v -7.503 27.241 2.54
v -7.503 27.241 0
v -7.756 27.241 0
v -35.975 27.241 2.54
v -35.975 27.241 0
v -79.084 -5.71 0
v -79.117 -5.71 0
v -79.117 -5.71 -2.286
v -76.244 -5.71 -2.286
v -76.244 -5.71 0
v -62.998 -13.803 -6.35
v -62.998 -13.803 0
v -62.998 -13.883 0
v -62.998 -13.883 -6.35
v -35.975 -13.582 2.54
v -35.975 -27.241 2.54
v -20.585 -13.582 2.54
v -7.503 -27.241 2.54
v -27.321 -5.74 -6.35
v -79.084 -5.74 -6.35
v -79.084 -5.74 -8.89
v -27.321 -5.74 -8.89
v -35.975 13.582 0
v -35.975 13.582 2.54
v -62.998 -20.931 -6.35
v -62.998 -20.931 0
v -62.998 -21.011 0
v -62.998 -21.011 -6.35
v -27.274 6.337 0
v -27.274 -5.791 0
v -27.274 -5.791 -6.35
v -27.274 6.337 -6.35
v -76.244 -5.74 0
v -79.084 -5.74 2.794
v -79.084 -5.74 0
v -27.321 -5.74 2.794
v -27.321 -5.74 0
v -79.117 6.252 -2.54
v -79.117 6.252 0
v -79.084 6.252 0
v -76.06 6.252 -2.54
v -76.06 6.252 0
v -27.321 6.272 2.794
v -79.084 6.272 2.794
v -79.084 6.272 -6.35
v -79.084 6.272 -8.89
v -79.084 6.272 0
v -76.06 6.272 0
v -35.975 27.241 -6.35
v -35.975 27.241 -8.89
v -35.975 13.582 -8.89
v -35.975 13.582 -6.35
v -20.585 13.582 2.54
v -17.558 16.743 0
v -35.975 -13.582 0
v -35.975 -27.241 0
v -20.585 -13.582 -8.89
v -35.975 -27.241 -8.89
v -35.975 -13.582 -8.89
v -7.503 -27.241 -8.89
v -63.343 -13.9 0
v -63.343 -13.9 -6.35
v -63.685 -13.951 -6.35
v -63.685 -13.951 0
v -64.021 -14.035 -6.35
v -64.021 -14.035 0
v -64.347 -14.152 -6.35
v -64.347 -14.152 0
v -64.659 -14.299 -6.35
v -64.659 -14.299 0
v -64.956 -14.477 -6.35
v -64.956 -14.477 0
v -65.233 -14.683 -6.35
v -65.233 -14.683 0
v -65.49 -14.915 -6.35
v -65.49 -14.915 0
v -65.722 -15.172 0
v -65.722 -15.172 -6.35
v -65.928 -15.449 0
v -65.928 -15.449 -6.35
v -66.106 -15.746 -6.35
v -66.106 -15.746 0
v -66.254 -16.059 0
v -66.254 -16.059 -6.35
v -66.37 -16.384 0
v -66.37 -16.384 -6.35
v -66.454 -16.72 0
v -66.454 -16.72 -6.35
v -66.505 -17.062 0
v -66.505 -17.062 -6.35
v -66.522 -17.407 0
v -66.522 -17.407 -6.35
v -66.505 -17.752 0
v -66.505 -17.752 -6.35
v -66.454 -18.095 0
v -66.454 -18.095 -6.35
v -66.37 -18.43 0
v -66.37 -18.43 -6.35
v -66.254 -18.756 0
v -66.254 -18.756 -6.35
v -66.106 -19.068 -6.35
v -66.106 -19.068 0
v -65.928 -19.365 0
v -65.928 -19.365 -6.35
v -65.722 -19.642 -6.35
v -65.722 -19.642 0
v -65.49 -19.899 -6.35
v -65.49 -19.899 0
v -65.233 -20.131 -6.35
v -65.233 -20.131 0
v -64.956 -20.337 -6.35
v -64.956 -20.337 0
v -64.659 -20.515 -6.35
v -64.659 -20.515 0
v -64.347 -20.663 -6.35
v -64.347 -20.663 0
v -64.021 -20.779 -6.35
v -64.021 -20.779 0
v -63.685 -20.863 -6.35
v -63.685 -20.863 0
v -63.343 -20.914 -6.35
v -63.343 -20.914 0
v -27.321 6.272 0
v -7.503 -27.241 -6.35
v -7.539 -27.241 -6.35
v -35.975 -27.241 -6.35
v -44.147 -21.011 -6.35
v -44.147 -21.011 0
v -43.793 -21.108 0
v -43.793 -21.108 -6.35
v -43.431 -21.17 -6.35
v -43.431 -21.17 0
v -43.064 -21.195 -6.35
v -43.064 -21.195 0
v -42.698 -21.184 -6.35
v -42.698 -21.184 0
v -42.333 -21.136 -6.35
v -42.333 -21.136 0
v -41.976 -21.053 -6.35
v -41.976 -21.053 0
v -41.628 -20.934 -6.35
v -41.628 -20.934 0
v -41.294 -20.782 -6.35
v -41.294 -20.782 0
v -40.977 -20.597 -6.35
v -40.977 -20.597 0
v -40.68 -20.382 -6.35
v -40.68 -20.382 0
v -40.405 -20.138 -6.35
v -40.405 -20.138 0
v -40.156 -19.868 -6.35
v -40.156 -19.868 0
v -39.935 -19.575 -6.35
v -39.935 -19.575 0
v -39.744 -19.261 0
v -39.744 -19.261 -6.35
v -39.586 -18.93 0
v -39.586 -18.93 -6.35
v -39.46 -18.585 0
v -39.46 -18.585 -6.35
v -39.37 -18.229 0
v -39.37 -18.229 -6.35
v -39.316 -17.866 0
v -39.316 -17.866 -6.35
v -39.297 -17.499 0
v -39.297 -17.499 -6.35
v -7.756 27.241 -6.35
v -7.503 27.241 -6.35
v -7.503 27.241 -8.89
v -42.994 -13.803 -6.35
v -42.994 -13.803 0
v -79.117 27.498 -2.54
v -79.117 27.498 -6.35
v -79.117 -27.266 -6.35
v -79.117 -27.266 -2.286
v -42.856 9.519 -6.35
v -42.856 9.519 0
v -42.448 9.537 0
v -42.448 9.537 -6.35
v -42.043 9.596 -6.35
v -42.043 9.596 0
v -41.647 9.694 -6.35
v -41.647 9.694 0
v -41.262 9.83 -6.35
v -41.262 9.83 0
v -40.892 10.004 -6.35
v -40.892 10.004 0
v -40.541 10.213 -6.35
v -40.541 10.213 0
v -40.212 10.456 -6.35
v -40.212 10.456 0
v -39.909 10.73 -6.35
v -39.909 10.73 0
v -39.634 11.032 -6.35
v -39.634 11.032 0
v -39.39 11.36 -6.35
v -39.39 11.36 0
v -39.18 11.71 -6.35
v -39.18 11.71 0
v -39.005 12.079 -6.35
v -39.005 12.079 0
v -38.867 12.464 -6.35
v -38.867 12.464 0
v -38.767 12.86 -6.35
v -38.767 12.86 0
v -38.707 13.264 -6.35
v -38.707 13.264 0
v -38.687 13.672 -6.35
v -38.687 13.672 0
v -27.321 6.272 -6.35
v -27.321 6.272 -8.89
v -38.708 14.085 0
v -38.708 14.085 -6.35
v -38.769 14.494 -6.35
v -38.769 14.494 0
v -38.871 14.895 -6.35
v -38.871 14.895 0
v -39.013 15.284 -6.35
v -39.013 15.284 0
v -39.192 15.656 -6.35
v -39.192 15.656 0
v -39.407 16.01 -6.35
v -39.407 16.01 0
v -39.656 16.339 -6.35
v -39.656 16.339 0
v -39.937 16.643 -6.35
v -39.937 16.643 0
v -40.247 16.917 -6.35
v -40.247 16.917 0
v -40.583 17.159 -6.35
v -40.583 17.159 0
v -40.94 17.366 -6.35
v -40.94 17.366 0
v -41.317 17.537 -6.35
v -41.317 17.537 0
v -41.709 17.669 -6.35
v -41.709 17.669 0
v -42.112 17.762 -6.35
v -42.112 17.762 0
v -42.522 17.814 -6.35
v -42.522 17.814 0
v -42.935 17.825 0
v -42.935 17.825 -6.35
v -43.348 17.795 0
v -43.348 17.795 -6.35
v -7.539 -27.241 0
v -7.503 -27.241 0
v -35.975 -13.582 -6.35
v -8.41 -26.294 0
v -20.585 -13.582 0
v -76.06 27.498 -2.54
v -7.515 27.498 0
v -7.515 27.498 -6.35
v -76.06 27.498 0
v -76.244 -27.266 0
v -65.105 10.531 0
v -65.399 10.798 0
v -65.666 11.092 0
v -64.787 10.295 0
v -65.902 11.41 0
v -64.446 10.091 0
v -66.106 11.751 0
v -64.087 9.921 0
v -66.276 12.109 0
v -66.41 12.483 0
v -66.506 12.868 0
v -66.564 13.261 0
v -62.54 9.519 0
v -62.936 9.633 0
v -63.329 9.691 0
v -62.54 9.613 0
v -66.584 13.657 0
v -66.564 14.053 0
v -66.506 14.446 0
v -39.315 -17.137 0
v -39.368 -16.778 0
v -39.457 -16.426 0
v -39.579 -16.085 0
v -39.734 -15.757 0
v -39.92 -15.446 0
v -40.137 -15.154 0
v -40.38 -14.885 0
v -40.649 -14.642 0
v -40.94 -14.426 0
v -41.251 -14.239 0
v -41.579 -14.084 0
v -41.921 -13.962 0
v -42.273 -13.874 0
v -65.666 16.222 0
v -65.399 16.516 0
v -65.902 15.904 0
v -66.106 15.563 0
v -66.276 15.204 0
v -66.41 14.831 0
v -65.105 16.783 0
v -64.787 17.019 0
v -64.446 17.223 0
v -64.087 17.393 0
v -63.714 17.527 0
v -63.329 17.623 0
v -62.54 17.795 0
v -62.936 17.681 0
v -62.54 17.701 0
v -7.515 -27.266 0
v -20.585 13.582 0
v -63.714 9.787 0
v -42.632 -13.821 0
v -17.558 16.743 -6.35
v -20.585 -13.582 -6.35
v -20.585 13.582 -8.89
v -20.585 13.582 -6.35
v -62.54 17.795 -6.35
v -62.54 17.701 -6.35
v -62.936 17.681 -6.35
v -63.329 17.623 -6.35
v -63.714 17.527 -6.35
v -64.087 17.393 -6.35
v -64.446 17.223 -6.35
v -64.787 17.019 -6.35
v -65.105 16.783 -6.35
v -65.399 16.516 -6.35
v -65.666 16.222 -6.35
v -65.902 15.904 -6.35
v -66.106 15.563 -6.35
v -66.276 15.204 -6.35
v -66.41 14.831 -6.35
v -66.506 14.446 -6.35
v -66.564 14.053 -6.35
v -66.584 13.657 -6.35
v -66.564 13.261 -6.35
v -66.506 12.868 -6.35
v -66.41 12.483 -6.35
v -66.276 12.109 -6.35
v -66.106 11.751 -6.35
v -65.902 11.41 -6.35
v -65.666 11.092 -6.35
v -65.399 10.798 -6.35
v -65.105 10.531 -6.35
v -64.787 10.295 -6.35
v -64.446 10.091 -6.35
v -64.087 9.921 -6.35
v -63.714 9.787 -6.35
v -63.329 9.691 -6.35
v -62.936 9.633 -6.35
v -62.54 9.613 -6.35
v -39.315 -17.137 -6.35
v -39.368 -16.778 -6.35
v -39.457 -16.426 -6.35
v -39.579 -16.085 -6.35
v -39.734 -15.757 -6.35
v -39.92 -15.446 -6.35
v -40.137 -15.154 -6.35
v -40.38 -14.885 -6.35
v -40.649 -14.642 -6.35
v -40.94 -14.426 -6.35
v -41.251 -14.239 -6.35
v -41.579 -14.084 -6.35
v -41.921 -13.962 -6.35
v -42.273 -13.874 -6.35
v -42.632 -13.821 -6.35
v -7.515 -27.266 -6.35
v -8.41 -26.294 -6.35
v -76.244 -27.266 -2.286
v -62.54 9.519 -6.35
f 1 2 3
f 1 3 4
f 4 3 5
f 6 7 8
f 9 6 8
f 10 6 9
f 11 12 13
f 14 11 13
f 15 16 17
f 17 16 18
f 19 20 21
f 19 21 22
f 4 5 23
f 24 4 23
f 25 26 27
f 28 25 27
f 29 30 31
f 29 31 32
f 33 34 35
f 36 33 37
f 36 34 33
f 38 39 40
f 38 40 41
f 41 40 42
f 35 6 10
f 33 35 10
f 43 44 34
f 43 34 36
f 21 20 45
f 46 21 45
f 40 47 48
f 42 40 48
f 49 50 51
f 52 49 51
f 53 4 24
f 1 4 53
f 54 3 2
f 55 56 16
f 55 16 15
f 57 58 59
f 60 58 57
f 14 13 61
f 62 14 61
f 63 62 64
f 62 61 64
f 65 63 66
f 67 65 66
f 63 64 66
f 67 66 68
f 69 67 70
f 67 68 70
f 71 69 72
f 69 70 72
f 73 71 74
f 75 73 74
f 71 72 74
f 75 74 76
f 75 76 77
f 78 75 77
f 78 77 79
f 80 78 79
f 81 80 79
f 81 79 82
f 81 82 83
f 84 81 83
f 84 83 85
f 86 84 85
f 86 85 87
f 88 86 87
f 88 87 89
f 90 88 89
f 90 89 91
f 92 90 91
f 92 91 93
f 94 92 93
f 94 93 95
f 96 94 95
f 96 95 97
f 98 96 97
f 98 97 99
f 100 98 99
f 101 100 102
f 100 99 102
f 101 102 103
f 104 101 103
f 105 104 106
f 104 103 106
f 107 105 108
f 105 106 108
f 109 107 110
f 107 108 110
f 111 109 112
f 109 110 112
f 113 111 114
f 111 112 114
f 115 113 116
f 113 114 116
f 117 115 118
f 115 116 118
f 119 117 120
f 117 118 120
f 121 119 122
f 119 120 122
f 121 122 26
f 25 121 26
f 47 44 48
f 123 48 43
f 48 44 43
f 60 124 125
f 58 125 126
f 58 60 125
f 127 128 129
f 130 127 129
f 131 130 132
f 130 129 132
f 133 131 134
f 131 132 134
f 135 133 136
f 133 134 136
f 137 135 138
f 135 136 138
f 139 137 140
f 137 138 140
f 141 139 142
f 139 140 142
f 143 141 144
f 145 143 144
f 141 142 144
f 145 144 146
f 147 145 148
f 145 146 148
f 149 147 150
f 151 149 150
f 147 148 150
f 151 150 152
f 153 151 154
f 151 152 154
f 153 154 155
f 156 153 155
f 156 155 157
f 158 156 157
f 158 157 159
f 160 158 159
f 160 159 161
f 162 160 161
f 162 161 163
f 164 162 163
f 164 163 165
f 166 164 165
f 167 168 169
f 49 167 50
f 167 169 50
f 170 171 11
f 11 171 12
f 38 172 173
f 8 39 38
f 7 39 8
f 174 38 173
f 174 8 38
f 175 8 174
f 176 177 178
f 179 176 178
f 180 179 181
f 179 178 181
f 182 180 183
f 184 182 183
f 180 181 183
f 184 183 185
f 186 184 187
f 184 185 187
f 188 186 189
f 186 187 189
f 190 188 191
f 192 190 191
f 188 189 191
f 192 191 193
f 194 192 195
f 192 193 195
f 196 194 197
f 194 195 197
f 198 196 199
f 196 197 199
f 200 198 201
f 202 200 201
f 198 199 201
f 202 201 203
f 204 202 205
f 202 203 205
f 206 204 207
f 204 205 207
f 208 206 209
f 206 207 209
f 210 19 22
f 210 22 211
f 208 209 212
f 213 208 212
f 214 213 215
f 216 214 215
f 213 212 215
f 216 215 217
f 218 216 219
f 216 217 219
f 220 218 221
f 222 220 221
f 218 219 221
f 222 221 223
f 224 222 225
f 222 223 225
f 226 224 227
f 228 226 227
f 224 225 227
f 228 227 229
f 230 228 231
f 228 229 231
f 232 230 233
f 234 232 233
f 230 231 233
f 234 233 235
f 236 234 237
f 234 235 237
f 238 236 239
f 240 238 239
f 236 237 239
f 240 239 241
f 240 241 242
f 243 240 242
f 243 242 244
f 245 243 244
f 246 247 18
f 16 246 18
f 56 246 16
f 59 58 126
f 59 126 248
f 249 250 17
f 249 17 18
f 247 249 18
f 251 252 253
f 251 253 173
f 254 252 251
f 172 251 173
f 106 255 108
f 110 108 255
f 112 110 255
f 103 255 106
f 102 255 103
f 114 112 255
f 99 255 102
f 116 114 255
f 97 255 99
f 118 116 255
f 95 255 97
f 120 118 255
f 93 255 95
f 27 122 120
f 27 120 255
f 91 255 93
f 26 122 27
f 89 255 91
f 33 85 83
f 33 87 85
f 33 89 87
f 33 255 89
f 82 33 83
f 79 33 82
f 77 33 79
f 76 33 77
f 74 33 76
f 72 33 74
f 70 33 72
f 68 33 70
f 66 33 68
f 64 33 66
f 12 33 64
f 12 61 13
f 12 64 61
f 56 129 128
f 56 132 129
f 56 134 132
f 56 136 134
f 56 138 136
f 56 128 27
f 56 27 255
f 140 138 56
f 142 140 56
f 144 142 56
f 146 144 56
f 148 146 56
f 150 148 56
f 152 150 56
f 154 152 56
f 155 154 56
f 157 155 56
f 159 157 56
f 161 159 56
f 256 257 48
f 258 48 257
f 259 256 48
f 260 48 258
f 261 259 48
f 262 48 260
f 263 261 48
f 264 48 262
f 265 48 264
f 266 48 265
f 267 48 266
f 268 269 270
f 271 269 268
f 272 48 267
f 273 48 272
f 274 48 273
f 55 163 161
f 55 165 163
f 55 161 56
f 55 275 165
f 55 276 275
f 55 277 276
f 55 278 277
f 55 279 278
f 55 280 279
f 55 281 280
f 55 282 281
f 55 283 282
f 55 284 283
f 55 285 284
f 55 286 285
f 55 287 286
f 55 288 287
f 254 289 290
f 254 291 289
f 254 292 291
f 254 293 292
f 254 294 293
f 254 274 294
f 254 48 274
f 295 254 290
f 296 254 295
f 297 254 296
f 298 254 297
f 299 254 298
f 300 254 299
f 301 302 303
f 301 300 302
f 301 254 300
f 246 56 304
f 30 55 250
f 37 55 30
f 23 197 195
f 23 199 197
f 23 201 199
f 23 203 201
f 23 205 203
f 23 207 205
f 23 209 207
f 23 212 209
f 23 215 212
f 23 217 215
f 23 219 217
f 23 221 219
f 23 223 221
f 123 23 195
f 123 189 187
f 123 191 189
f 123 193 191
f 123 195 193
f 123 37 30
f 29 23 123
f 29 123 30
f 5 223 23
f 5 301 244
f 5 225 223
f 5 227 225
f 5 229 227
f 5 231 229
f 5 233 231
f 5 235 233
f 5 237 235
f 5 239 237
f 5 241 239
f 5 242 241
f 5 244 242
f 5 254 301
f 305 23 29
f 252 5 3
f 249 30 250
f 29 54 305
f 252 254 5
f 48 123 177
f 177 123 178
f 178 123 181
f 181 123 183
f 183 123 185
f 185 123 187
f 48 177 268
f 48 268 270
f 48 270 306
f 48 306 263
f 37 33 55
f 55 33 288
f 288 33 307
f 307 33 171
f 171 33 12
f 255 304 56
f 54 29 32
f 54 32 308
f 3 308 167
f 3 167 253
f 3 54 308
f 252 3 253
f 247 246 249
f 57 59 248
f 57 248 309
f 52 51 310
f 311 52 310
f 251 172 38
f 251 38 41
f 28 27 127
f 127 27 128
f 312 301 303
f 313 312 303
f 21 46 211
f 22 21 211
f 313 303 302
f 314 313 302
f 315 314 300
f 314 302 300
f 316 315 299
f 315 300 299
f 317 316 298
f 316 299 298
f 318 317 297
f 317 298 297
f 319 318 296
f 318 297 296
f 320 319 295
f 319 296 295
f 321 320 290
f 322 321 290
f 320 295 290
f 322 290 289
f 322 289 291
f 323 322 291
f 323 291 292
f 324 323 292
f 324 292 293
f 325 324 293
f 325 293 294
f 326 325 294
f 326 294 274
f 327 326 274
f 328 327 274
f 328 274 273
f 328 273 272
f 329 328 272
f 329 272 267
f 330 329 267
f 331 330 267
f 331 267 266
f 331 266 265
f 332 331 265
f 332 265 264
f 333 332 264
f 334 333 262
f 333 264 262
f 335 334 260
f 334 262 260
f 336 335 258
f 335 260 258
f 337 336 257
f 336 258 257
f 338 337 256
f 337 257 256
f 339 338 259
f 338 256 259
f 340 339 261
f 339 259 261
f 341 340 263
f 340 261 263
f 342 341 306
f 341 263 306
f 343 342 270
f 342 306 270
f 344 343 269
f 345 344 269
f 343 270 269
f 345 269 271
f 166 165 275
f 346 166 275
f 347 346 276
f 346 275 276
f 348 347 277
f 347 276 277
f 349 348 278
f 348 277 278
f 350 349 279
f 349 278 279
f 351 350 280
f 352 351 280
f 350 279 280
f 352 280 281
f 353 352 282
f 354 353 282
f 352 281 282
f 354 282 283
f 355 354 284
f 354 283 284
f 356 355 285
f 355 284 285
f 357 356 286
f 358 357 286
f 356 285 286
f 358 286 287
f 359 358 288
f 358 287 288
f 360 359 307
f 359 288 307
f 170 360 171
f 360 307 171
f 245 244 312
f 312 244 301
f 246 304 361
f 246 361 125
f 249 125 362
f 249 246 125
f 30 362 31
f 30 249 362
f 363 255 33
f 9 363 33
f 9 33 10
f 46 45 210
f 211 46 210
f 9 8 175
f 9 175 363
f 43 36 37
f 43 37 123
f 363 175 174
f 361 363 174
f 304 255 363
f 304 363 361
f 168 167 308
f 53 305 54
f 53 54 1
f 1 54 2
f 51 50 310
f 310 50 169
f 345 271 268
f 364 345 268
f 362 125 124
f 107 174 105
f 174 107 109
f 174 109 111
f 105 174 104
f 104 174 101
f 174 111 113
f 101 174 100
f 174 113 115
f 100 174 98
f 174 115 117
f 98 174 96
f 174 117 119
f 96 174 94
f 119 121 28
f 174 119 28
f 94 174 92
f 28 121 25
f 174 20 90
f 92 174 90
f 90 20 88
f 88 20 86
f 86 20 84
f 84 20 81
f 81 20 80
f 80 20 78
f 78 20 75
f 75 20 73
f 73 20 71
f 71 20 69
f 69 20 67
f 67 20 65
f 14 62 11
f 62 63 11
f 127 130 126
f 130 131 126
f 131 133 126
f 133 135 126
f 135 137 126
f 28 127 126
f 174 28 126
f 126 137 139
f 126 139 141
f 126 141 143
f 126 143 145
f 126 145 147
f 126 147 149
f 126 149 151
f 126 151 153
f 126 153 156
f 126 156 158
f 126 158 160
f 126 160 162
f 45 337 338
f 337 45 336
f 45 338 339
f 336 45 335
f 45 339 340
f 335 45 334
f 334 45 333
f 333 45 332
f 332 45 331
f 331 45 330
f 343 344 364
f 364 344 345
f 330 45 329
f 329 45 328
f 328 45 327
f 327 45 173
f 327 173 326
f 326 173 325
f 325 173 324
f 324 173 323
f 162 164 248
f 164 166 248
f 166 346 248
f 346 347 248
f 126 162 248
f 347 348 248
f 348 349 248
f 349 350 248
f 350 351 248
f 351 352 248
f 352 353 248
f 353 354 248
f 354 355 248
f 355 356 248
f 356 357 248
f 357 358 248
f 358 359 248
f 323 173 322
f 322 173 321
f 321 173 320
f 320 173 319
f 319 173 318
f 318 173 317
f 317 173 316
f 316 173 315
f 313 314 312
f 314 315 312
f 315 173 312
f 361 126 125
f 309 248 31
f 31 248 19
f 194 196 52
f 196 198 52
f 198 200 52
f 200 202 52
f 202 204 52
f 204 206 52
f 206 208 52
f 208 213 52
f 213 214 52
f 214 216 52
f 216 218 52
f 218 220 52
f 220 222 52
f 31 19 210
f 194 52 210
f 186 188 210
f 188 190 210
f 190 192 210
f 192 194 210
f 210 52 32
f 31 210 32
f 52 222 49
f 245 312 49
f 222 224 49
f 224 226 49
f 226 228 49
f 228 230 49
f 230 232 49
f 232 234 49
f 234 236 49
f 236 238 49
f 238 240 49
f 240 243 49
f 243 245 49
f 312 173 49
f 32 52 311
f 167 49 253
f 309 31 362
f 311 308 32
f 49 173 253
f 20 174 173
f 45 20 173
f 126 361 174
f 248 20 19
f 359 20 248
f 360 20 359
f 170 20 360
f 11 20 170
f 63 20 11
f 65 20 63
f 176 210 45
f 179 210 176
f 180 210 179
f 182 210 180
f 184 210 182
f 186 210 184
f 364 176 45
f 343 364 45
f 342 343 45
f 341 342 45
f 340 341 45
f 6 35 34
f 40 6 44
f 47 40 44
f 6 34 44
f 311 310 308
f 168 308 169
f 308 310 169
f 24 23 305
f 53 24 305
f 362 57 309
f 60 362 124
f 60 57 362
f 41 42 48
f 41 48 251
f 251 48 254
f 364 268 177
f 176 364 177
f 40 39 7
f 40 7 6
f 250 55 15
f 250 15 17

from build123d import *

# Parameters (mm, degrees)
F1_DEPTH  = 2.54
F4_DEPTH  = 6.35
F8_W      = 51.7626535147
F8_H      = 12.0121920481
F9_DEPTH  = 11.684
F10_W     = 3.2028928399
F10_H     = 21.3907221332
F11_DEPTH = 2.54
F12_W     = 3.4383758903
F12_H     = 21.8503316864
F13_DEPTH = 2.286
F15_DEPTH = 25.4
F17_DEPTH = 25.4


with BuildPart() as f1:
    # F0 (on Top) → F1 (new body)
    with BuildSketch(Plane.XY):
        Polygon((-7.5027812272, 27.2412225604), (-35.9747856855, 27.2412225604), (-35.9747856855, 13.5823562741), (-20.5845143646, 13.5823562741), align=None)
    extrude(amount=F1_DEPTH)


with BuildPart() as f2_1:
    # F2: instance of F1
    add(f1.part.mirror(Plane.XZ))


with BuildPart() as f4:
    # F3 (on Top) → F4 (new body)
    with BuildSketch(Plane.XY):
        Polygon((-27.2736139596, 6.3365907408), (-7.5153368525, 27.4984613061), (-79.1166648269, 27.4984613061), (-79.1166648269, -27.2664036602), (-7.5153368525, -27.2664036602), (-27.2736139596, -5.7910899632), align=None)
    extrude(amount=-F4_DEPTH)


with BuildPart() as f6_1:
    # F6: copy of F1
    add(f1.part.moved(Location((0, 0, -8.89))))


with BuildPart() as f7_1:
    # F7: copy of F2_1
    add(f2_1.part.moved(Location((0, 0, -8.89))))


with BuildPart() as f1_1:
    add(f1.part)

    add(f2_1.part)  # F9 merges F2_1

    add(f4.part)  # F9 merges F4

    add(f6_1.part)  # F9 merges F6_1

    add(f7_1.part)  # F9 merges F7_1
    # F8 (on offset) → F9 (join)
    with BuildSketch(Plane.XY.offset(2.794)):
        with Locations((-53.2025257125, 0.2657445148)):
            Rectangle(F8_W, F8_H)
    extrude(amount=-F9_DEPTH)

    # F10 (on Top) → F11 (cut)
    with BuildSketch(Plane.XY):
        with Locations((-77.6618160307, 16.9474571012)):
            Rectangle(F10_W, F10_H)
    extrude(amount=-F11_DEPTH, mode=Mode.SUBTRACT)

    # F12 (on Top) → F13 (cut)
    with BuildSketch(Plane.XY):
        with Locations((-77.9631473124, -16.6356083937)):
            Rectangle(F12_W, F12_H)
    extrude(amount=-F13_DEPTH, mode=Mode.SUBTRACT)

    # F14 (on offset) → F15 (cut)
    with BuildSketch(Plane.XY.offset(2.794)):
        with BuildLine():
            Line((-42.855940921, 17.7954155952), (-42.855940921, 9.5185028021))
            ThreePointArc((-42.855940921, 9.5185028021), (-39.9091769658, 10.729969596), (-38.6873239795, 13.6724421754))
            ThreePointArc((-38.6873239795, 13.6724421754), (-40.0888769364, 16.7836563698), (-43.3477644342, 17.7954155952))
            Line((-43.3477644342, 17.7954155952), (-42.855940921, 17.7954155952))
        make_face()
        with BuildLine():
            Line((-62.5399425626, 9.5185028021), (-42.855940921, 9.5185028021))
            ThreePointArc((-42.855940921, 9.5185028021), (-46.9879402117, 13.4260434851), (-43.3477644342, 17.7954155952))
            Line((-43.3477644342, 17.7954155952), (-62.5399425626, 17.7954155952))
            Line((-62.5399425626, 17.7954155952), (-62.5399425626, 17.7007548757))
            ThreePointArc((-62.5399425626, 17.7007548757), (-59.6805472176, 16.5163545436), (-58.4961468855, 13.6569591987))
            ThreePointArc((-58.4961468855, 13.6569591987), (-59.6805472176, 10.7975638537), (-62.5399425626, 9.6131635216))
            Line((-62.5399425626, 9.6131635216), (-62.5399425626, 9.5185028021))
        make_face()
        with BuildLine():
            ThreePointArc((-43.3477644342, 17.7954155952), (-46.9879402117, 13.4260434851), (-42.855940921, 9.5185028021))
            Line((-42.855940921, 9.5185028021), (-42.855940921, 17.7954155952))
            Line((-42.855940921, 17.7954155952), (-43.3477644342, 17.7954155952))
        make_face()
        with BuildLine():
            ThreePointArc((-62.5399425626, 17.7007548757), (-66.5837382396, 13.6569591987), (-62.5399425626, 9.6131635216))
            Line((-62.5399425626, 9.6131635216), (-62.5399425626, 17.7007548757))
        make_face()
        with BuildLine():
            Line((-62.5399425626, 17.7007548757), (-62.5399425626, 9.6131635216))
            ThreePointArc((-62.5399425626, 9.6131635216), (-59.6805472176, 10.7975638537), (-58.4961468855, 13.6569591987))
            ThreePointArc((-58.4961468855, 13.6569591987), (-59.6805472176, 16.5163545436), (-62.5399425626, 17.7007548757))
        make_face()
    extrude(amount=-F15_DEPTH, mode=Mode.SUBTRACT)

    # F16 (on Top) → F17 (cut)
    with BuildSketch(Plane.XY):
        with BuildLine():
            ThreePointArc((-44.1468792435, -21.0114289075), (-40.8257271545, -20.4931034722), (-39.2974471919, -17.4992643297))
            ThreePointArc((-39.2974471919, -17.4992643297), (-40.3801402653, -14.8854120279), (-42.9939925671, -13.8027189545))
            Line((-42.9939925671, -13.8027189545), (-42.9939925671, -21.0114289075))
            Line((-42.9939925671, -21.0114289075), (-44.1468792435, -21.0114289075))
        make_face()
        with BuildLine():
            Line((-42.9939925671, -21.0114289075), (-42.9939925671, -13.8027189545))
            ThreePointArc((-42.9939925671, -13.8027189545), (-46.6441517031, -16.9154955469), (-44.1468792435, -21.0114289075))
            Line((-44.1468792435, -21.0114289075), (-42.9939925671, -21.0114289075))
        make_face()
        with BuildLine():
            ThreePointArc((-44.1468792435, -21.0114289075), (-46.6441517031, -16.9154955469), (-42.9939925671, -13.8027189545))
            Line((-42.9939925671, -13.8027189545), (-62.9980564117, -13.8027189545))
            Line((-62.9980564117, -13.8027189545), (-62.9980564117, -13.8833889438))
            ThreePointArc((-62.9980564117, -13.8833889438), (-60.5064348625, -14.9154523818), (-59.4743714246, -17.407073931))
            ThreePointArc((-59.4743714246, -17.407073931), (-60.5064348625, -19.8986954802), (-62.9980564117, -20.9307589182))
            Line((-62.9980564117, -20.9307589182), (-62.9980564117, -21.0114289075))
            Line((-62.9980564117, -21.0114289075), (-44.1468792435, -21.0114289075))
        make_face()
        with BuildLine():
            ThreePointArc((-59.4743714246, -17.407073931), (-60.5064348625, -14.9154523818), (-62.9980564117, -13.8833889438))
            Line((-62.9980564117, -13.8833889438), (-62.9980564117, -20.9307589182))
            ThreePointArc((-62.9980564117, -20.9307589182), (-60.5064348625, -19.8986954802), (-59.4743714246, -17.407073931))
        make_face()
        with BuildLine():
            Line((-62.9980564117, -20.9307589182), (-62.9980564117, -13.8833889438))
            ThreePointArc((-62.9980564117, -13.8833889438), (-66.5217413989, -17.407073931), (-62.9980564117, -20.9307589182))
        make_face()
    extrude(amount=-F17_DEPTH, mode=Mode.SUBTRACT)


solid = f1_1.part
